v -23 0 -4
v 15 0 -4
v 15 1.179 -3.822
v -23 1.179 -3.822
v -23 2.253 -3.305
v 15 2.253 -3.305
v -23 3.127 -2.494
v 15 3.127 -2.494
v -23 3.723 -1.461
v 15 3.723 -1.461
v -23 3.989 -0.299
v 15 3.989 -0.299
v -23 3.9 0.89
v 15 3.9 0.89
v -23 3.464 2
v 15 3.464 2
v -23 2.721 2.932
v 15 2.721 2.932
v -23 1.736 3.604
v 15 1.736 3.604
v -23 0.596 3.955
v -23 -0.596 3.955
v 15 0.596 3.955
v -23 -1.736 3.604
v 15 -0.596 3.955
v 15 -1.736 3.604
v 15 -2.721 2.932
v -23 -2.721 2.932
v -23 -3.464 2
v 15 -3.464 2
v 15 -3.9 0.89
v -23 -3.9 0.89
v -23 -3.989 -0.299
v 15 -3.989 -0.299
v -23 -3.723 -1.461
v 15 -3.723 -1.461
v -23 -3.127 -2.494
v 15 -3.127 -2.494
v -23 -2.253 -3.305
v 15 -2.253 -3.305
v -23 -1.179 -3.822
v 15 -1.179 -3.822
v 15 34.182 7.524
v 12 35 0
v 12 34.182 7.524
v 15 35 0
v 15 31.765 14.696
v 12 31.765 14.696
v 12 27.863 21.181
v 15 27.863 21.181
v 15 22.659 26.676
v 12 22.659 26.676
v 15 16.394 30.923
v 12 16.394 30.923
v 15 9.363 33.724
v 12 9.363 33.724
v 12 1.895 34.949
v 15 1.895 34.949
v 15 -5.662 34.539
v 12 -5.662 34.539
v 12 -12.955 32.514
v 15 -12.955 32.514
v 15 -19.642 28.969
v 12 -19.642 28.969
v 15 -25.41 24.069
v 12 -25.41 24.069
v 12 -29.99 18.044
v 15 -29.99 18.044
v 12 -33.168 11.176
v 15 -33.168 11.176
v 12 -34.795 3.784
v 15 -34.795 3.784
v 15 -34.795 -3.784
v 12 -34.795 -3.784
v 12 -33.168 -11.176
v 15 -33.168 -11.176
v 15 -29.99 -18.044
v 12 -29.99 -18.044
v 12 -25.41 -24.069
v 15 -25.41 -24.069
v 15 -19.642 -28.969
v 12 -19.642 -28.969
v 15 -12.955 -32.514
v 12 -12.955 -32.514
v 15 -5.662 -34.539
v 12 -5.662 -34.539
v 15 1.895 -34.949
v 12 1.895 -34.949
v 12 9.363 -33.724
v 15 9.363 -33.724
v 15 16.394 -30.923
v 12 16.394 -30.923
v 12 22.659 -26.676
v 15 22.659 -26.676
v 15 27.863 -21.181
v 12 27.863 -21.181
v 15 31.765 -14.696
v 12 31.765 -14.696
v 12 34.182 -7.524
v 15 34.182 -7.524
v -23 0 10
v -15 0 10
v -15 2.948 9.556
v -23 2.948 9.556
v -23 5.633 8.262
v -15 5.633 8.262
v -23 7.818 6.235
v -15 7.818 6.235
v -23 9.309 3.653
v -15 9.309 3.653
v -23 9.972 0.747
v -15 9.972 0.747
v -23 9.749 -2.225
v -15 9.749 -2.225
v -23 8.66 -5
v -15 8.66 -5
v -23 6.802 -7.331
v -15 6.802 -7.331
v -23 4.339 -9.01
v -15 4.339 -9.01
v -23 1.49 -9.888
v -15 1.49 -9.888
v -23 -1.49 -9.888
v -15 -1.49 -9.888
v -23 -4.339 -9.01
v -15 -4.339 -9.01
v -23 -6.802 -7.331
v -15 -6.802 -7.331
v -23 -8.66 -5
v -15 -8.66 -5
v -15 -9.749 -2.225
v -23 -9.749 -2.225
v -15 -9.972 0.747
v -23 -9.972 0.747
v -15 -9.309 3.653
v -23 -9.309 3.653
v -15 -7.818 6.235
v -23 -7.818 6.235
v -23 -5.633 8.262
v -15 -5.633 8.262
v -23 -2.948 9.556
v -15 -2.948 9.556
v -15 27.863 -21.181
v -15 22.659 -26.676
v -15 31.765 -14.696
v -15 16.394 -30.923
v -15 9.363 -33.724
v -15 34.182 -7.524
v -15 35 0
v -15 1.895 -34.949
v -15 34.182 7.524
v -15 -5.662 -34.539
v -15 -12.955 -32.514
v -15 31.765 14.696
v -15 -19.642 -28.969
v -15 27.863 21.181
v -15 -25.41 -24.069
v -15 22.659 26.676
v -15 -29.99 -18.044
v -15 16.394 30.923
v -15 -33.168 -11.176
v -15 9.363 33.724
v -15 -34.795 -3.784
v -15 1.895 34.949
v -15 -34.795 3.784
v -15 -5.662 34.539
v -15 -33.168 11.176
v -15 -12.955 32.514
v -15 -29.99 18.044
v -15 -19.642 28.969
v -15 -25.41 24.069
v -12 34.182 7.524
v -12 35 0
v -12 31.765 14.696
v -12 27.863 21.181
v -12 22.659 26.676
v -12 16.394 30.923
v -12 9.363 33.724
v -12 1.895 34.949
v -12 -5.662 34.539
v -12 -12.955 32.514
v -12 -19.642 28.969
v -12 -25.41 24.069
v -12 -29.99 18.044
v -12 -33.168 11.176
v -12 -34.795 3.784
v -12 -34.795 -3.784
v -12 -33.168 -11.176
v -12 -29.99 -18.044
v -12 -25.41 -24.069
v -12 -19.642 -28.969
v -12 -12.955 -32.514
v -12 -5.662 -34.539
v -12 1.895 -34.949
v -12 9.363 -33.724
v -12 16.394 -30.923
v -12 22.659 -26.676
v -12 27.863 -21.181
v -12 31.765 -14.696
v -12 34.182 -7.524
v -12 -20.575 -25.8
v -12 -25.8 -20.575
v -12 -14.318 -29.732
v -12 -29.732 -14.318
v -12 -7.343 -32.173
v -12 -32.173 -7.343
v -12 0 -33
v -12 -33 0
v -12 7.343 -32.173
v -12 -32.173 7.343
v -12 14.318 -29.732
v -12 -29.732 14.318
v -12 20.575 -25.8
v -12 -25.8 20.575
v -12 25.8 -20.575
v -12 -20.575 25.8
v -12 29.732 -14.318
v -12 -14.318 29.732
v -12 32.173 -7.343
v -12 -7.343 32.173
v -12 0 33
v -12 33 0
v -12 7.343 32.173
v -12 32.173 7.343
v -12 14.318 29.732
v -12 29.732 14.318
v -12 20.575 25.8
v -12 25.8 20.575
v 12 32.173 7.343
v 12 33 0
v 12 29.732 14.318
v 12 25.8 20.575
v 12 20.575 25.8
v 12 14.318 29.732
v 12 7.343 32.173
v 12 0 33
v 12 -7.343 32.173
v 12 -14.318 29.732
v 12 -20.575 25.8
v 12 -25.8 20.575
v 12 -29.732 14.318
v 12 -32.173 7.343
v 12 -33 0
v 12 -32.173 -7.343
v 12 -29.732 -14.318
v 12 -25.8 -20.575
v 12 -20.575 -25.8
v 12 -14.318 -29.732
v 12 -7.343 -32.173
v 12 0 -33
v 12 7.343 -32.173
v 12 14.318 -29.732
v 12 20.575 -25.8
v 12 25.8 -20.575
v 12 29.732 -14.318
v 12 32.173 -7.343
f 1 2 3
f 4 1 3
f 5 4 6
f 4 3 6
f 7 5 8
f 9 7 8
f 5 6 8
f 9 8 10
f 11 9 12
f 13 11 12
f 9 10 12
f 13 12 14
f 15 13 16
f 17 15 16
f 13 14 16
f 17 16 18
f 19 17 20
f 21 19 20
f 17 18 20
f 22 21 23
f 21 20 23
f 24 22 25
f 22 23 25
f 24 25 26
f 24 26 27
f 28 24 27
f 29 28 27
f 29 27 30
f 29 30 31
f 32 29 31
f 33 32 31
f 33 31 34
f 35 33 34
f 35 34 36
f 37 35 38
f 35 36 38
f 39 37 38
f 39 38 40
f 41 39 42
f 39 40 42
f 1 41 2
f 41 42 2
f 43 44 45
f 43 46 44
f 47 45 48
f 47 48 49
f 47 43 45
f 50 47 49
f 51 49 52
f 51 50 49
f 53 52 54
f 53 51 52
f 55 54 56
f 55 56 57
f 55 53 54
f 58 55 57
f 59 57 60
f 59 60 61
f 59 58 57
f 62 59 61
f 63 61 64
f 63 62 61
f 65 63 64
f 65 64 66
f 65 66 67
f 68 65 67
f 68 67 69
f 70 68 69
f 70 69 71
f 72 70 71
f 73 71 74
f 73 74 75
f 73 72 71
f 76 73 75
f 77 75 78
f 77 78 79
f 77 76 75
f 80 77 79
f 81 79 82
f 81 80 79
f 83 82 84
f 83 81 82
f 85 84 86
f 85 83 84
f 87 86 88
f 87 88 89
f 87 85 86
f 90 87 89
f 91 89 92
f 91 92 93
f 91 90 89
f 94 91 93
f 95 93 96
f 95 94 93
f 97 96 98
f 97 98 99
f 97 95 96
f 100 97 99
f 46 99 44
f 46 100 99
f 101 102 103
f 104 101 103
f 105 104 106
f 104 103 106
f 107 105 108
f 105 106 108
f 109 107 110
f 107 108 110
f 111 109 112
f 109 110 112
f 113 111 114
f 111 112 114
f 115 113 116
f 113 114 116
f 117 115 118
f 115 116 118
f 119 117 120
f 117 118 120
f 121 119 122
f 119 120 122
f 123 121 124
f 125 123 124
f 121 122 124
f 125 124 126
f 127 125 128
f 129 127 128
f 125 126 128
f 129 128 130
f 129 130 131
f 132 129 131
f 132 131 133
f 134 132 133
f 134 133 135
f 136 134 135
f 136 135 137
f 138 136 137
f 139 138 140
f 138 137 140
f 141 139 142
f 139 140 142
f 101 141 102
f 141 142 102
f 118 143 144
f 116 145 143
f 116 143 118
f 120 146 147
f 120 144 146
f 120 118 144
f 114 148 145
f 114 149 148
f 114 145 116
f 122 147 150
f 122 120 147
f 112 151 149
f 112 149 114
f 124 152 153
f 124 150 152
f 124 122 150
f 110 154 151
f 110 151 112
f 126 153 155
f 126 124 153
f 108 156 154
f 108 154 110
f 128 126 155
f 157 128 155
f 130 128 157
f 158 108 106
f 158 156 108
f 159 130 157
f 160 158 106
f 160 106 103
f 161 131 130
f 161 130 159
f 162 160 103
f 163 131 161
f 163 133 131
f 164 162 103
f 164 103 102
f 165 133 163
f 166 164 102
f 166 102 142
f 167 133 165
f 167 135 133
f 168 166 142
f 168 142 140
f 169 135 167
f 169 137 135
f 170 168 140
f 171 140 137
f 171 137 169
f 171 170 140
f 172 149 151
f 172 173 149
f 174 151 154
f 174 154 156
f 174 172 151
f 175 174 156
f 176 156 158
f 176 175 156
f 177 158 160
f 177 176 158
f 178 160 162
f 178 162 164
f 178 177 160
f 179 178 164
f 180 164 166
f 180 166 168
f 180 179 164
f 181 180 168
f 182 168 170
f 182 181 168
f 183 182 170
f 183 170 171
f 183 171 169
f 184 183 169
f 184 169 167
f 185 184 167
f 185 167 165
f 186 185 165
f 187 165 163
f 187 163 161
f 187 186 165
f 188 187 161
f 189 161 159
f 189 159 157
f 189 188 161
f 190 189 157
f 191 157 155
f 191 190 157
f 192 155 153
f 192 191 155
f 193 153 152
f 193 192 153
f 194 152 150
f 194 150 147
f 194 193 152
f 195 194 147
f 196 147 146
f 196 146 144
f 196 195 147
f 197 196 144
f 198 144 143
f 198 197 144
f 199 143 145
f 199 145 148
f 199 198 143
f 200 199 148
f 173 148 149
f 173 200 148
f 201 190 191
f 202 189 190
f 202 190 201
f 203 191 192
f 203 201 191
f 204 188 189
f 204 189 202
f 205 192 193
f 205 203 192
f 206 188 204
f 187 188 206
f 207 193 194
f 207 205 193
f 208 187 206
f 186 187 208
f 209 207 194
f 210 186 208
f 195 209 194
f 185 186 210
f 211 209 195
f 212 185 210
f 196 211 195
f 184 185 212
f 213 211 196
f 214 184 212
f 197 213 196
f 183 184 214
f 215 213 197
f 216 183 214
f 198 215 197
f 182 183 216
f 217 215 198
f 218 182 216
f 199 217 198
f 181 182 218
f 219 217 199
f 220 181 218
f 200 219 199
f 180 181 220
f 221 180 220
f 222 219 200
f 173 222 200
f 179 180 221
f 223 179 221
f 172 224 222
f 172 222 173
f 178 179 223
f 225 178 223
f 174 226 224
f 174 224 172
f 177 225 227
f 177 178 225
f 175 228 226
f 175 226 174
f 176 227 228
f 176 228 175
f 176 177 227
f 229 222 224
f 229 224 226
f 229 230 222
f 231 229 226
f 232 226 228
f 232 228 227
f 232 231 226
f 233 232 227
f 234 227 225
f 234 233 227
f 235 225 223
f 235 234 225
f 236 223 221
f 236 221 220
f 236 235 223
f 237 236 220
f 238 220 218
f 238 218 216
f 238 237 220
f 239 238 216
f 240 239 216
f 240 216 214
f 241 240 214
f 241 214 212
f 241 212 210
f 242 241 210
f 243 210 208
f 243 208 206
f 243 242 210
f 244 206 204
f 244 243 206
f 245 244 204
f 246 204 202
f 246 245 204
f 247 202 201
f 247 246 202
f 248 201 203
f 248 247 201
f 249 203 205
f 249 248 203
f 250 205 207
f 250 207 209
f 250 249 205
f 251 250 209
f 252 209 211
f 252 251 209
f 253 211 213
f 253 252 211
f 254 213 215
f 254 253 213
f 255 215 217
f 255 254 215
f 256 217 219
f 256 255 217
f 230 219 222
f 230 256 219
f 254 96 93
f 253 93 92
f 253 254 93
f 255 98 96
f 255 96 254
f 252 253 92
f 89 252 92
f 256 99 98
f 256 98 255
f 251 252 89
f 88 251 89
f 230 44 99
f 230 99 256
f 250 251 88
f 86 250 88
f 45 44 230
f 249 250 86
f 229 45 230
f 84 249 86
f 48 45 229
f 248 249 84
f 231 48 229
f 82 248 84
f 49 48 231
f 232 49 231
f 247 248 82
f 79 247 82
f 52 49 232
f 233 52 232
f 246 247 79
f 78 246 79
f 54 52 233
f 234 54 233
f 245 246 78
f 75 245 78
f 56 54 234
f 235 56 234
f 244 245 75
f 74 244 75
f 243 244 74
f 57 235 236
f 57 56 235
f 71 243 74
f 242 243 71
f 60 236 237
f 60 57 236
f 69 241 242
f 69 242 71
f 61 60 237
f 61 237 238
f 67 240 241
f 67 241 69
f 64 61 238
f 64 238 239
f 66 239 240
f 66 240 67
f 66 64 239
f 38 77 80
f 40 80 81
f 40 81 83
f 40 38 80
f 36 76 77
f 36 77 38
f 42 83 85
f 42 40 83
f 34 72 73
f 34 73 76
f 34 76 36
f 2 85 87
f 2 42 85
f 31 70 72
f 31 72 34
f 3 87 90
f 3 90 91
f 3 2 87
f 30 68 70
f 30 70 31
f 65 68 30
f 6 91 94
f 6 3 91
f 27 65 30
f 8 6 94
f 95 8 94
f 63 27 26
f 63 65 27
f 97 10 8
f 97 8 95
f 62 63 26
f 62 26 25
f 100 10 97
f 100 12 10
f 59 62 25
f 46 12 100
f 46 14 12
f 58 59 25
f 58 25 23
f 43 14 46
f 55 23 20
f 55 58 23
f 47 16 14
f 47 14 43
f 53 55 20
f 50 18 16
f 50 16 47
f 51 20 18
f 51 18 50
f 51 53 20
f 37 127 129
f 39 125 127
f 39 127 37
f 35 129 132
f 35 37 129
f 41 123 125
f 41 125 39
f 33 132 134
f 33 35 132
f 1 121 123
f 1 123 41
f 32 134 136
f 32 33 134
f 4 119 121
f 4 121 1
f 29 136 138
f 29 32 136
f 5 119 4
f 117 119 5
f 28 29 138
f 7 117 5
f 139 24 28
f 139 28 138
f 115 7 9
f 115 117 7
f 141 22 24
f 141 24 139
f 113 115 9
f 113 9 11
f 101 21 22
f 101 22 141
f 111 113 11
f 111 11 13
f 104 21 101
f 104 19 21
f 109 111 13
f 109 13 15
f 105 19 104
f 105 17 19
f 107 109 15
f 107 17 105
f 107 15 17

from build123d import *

# Parameters (mm, degrees)
SKETCH4_R           = 10
BOSS_EXTRUDE2_DEPTH = 8
SKETCH6_R           = 4
CUT_EXTRUDE1_DEPTH  = 38


with BuildPart() as part:
    # Sketch1 → Revolve1 (revolve)
    with BuildSketch(Plane.XY):
        Polygon((12, 35), (15, 35), (15, 0), (-15, 0), (-15, 35), (-12, 35), (-12, 33), (12, 33), align=None)
    revolve(axis=Axis((-15, 0, 0), (1, 0, 0)))

    # Sketch4 → Boss-Extrude2 (add)
    with BuildSketch(Plane.ZY.offset(15)):
        Circle(SKETCH4_R)
    extrude(amount=BOSS_EXTRUDE2_DEPTH)

    # Sketch6 → Cut-Extrude1 (cut)
    with BuildSketch(Plane(origin=(15, 0, 0), x_dir=(0, 0, -1), z_dir=(1, 0, 0))):
        Circle(SKETCH6_R)
    extrude(amount=-CUT_EXTRUDE1_DEPTH, mode=Mode.SUBTRACT)


solid = part.part
